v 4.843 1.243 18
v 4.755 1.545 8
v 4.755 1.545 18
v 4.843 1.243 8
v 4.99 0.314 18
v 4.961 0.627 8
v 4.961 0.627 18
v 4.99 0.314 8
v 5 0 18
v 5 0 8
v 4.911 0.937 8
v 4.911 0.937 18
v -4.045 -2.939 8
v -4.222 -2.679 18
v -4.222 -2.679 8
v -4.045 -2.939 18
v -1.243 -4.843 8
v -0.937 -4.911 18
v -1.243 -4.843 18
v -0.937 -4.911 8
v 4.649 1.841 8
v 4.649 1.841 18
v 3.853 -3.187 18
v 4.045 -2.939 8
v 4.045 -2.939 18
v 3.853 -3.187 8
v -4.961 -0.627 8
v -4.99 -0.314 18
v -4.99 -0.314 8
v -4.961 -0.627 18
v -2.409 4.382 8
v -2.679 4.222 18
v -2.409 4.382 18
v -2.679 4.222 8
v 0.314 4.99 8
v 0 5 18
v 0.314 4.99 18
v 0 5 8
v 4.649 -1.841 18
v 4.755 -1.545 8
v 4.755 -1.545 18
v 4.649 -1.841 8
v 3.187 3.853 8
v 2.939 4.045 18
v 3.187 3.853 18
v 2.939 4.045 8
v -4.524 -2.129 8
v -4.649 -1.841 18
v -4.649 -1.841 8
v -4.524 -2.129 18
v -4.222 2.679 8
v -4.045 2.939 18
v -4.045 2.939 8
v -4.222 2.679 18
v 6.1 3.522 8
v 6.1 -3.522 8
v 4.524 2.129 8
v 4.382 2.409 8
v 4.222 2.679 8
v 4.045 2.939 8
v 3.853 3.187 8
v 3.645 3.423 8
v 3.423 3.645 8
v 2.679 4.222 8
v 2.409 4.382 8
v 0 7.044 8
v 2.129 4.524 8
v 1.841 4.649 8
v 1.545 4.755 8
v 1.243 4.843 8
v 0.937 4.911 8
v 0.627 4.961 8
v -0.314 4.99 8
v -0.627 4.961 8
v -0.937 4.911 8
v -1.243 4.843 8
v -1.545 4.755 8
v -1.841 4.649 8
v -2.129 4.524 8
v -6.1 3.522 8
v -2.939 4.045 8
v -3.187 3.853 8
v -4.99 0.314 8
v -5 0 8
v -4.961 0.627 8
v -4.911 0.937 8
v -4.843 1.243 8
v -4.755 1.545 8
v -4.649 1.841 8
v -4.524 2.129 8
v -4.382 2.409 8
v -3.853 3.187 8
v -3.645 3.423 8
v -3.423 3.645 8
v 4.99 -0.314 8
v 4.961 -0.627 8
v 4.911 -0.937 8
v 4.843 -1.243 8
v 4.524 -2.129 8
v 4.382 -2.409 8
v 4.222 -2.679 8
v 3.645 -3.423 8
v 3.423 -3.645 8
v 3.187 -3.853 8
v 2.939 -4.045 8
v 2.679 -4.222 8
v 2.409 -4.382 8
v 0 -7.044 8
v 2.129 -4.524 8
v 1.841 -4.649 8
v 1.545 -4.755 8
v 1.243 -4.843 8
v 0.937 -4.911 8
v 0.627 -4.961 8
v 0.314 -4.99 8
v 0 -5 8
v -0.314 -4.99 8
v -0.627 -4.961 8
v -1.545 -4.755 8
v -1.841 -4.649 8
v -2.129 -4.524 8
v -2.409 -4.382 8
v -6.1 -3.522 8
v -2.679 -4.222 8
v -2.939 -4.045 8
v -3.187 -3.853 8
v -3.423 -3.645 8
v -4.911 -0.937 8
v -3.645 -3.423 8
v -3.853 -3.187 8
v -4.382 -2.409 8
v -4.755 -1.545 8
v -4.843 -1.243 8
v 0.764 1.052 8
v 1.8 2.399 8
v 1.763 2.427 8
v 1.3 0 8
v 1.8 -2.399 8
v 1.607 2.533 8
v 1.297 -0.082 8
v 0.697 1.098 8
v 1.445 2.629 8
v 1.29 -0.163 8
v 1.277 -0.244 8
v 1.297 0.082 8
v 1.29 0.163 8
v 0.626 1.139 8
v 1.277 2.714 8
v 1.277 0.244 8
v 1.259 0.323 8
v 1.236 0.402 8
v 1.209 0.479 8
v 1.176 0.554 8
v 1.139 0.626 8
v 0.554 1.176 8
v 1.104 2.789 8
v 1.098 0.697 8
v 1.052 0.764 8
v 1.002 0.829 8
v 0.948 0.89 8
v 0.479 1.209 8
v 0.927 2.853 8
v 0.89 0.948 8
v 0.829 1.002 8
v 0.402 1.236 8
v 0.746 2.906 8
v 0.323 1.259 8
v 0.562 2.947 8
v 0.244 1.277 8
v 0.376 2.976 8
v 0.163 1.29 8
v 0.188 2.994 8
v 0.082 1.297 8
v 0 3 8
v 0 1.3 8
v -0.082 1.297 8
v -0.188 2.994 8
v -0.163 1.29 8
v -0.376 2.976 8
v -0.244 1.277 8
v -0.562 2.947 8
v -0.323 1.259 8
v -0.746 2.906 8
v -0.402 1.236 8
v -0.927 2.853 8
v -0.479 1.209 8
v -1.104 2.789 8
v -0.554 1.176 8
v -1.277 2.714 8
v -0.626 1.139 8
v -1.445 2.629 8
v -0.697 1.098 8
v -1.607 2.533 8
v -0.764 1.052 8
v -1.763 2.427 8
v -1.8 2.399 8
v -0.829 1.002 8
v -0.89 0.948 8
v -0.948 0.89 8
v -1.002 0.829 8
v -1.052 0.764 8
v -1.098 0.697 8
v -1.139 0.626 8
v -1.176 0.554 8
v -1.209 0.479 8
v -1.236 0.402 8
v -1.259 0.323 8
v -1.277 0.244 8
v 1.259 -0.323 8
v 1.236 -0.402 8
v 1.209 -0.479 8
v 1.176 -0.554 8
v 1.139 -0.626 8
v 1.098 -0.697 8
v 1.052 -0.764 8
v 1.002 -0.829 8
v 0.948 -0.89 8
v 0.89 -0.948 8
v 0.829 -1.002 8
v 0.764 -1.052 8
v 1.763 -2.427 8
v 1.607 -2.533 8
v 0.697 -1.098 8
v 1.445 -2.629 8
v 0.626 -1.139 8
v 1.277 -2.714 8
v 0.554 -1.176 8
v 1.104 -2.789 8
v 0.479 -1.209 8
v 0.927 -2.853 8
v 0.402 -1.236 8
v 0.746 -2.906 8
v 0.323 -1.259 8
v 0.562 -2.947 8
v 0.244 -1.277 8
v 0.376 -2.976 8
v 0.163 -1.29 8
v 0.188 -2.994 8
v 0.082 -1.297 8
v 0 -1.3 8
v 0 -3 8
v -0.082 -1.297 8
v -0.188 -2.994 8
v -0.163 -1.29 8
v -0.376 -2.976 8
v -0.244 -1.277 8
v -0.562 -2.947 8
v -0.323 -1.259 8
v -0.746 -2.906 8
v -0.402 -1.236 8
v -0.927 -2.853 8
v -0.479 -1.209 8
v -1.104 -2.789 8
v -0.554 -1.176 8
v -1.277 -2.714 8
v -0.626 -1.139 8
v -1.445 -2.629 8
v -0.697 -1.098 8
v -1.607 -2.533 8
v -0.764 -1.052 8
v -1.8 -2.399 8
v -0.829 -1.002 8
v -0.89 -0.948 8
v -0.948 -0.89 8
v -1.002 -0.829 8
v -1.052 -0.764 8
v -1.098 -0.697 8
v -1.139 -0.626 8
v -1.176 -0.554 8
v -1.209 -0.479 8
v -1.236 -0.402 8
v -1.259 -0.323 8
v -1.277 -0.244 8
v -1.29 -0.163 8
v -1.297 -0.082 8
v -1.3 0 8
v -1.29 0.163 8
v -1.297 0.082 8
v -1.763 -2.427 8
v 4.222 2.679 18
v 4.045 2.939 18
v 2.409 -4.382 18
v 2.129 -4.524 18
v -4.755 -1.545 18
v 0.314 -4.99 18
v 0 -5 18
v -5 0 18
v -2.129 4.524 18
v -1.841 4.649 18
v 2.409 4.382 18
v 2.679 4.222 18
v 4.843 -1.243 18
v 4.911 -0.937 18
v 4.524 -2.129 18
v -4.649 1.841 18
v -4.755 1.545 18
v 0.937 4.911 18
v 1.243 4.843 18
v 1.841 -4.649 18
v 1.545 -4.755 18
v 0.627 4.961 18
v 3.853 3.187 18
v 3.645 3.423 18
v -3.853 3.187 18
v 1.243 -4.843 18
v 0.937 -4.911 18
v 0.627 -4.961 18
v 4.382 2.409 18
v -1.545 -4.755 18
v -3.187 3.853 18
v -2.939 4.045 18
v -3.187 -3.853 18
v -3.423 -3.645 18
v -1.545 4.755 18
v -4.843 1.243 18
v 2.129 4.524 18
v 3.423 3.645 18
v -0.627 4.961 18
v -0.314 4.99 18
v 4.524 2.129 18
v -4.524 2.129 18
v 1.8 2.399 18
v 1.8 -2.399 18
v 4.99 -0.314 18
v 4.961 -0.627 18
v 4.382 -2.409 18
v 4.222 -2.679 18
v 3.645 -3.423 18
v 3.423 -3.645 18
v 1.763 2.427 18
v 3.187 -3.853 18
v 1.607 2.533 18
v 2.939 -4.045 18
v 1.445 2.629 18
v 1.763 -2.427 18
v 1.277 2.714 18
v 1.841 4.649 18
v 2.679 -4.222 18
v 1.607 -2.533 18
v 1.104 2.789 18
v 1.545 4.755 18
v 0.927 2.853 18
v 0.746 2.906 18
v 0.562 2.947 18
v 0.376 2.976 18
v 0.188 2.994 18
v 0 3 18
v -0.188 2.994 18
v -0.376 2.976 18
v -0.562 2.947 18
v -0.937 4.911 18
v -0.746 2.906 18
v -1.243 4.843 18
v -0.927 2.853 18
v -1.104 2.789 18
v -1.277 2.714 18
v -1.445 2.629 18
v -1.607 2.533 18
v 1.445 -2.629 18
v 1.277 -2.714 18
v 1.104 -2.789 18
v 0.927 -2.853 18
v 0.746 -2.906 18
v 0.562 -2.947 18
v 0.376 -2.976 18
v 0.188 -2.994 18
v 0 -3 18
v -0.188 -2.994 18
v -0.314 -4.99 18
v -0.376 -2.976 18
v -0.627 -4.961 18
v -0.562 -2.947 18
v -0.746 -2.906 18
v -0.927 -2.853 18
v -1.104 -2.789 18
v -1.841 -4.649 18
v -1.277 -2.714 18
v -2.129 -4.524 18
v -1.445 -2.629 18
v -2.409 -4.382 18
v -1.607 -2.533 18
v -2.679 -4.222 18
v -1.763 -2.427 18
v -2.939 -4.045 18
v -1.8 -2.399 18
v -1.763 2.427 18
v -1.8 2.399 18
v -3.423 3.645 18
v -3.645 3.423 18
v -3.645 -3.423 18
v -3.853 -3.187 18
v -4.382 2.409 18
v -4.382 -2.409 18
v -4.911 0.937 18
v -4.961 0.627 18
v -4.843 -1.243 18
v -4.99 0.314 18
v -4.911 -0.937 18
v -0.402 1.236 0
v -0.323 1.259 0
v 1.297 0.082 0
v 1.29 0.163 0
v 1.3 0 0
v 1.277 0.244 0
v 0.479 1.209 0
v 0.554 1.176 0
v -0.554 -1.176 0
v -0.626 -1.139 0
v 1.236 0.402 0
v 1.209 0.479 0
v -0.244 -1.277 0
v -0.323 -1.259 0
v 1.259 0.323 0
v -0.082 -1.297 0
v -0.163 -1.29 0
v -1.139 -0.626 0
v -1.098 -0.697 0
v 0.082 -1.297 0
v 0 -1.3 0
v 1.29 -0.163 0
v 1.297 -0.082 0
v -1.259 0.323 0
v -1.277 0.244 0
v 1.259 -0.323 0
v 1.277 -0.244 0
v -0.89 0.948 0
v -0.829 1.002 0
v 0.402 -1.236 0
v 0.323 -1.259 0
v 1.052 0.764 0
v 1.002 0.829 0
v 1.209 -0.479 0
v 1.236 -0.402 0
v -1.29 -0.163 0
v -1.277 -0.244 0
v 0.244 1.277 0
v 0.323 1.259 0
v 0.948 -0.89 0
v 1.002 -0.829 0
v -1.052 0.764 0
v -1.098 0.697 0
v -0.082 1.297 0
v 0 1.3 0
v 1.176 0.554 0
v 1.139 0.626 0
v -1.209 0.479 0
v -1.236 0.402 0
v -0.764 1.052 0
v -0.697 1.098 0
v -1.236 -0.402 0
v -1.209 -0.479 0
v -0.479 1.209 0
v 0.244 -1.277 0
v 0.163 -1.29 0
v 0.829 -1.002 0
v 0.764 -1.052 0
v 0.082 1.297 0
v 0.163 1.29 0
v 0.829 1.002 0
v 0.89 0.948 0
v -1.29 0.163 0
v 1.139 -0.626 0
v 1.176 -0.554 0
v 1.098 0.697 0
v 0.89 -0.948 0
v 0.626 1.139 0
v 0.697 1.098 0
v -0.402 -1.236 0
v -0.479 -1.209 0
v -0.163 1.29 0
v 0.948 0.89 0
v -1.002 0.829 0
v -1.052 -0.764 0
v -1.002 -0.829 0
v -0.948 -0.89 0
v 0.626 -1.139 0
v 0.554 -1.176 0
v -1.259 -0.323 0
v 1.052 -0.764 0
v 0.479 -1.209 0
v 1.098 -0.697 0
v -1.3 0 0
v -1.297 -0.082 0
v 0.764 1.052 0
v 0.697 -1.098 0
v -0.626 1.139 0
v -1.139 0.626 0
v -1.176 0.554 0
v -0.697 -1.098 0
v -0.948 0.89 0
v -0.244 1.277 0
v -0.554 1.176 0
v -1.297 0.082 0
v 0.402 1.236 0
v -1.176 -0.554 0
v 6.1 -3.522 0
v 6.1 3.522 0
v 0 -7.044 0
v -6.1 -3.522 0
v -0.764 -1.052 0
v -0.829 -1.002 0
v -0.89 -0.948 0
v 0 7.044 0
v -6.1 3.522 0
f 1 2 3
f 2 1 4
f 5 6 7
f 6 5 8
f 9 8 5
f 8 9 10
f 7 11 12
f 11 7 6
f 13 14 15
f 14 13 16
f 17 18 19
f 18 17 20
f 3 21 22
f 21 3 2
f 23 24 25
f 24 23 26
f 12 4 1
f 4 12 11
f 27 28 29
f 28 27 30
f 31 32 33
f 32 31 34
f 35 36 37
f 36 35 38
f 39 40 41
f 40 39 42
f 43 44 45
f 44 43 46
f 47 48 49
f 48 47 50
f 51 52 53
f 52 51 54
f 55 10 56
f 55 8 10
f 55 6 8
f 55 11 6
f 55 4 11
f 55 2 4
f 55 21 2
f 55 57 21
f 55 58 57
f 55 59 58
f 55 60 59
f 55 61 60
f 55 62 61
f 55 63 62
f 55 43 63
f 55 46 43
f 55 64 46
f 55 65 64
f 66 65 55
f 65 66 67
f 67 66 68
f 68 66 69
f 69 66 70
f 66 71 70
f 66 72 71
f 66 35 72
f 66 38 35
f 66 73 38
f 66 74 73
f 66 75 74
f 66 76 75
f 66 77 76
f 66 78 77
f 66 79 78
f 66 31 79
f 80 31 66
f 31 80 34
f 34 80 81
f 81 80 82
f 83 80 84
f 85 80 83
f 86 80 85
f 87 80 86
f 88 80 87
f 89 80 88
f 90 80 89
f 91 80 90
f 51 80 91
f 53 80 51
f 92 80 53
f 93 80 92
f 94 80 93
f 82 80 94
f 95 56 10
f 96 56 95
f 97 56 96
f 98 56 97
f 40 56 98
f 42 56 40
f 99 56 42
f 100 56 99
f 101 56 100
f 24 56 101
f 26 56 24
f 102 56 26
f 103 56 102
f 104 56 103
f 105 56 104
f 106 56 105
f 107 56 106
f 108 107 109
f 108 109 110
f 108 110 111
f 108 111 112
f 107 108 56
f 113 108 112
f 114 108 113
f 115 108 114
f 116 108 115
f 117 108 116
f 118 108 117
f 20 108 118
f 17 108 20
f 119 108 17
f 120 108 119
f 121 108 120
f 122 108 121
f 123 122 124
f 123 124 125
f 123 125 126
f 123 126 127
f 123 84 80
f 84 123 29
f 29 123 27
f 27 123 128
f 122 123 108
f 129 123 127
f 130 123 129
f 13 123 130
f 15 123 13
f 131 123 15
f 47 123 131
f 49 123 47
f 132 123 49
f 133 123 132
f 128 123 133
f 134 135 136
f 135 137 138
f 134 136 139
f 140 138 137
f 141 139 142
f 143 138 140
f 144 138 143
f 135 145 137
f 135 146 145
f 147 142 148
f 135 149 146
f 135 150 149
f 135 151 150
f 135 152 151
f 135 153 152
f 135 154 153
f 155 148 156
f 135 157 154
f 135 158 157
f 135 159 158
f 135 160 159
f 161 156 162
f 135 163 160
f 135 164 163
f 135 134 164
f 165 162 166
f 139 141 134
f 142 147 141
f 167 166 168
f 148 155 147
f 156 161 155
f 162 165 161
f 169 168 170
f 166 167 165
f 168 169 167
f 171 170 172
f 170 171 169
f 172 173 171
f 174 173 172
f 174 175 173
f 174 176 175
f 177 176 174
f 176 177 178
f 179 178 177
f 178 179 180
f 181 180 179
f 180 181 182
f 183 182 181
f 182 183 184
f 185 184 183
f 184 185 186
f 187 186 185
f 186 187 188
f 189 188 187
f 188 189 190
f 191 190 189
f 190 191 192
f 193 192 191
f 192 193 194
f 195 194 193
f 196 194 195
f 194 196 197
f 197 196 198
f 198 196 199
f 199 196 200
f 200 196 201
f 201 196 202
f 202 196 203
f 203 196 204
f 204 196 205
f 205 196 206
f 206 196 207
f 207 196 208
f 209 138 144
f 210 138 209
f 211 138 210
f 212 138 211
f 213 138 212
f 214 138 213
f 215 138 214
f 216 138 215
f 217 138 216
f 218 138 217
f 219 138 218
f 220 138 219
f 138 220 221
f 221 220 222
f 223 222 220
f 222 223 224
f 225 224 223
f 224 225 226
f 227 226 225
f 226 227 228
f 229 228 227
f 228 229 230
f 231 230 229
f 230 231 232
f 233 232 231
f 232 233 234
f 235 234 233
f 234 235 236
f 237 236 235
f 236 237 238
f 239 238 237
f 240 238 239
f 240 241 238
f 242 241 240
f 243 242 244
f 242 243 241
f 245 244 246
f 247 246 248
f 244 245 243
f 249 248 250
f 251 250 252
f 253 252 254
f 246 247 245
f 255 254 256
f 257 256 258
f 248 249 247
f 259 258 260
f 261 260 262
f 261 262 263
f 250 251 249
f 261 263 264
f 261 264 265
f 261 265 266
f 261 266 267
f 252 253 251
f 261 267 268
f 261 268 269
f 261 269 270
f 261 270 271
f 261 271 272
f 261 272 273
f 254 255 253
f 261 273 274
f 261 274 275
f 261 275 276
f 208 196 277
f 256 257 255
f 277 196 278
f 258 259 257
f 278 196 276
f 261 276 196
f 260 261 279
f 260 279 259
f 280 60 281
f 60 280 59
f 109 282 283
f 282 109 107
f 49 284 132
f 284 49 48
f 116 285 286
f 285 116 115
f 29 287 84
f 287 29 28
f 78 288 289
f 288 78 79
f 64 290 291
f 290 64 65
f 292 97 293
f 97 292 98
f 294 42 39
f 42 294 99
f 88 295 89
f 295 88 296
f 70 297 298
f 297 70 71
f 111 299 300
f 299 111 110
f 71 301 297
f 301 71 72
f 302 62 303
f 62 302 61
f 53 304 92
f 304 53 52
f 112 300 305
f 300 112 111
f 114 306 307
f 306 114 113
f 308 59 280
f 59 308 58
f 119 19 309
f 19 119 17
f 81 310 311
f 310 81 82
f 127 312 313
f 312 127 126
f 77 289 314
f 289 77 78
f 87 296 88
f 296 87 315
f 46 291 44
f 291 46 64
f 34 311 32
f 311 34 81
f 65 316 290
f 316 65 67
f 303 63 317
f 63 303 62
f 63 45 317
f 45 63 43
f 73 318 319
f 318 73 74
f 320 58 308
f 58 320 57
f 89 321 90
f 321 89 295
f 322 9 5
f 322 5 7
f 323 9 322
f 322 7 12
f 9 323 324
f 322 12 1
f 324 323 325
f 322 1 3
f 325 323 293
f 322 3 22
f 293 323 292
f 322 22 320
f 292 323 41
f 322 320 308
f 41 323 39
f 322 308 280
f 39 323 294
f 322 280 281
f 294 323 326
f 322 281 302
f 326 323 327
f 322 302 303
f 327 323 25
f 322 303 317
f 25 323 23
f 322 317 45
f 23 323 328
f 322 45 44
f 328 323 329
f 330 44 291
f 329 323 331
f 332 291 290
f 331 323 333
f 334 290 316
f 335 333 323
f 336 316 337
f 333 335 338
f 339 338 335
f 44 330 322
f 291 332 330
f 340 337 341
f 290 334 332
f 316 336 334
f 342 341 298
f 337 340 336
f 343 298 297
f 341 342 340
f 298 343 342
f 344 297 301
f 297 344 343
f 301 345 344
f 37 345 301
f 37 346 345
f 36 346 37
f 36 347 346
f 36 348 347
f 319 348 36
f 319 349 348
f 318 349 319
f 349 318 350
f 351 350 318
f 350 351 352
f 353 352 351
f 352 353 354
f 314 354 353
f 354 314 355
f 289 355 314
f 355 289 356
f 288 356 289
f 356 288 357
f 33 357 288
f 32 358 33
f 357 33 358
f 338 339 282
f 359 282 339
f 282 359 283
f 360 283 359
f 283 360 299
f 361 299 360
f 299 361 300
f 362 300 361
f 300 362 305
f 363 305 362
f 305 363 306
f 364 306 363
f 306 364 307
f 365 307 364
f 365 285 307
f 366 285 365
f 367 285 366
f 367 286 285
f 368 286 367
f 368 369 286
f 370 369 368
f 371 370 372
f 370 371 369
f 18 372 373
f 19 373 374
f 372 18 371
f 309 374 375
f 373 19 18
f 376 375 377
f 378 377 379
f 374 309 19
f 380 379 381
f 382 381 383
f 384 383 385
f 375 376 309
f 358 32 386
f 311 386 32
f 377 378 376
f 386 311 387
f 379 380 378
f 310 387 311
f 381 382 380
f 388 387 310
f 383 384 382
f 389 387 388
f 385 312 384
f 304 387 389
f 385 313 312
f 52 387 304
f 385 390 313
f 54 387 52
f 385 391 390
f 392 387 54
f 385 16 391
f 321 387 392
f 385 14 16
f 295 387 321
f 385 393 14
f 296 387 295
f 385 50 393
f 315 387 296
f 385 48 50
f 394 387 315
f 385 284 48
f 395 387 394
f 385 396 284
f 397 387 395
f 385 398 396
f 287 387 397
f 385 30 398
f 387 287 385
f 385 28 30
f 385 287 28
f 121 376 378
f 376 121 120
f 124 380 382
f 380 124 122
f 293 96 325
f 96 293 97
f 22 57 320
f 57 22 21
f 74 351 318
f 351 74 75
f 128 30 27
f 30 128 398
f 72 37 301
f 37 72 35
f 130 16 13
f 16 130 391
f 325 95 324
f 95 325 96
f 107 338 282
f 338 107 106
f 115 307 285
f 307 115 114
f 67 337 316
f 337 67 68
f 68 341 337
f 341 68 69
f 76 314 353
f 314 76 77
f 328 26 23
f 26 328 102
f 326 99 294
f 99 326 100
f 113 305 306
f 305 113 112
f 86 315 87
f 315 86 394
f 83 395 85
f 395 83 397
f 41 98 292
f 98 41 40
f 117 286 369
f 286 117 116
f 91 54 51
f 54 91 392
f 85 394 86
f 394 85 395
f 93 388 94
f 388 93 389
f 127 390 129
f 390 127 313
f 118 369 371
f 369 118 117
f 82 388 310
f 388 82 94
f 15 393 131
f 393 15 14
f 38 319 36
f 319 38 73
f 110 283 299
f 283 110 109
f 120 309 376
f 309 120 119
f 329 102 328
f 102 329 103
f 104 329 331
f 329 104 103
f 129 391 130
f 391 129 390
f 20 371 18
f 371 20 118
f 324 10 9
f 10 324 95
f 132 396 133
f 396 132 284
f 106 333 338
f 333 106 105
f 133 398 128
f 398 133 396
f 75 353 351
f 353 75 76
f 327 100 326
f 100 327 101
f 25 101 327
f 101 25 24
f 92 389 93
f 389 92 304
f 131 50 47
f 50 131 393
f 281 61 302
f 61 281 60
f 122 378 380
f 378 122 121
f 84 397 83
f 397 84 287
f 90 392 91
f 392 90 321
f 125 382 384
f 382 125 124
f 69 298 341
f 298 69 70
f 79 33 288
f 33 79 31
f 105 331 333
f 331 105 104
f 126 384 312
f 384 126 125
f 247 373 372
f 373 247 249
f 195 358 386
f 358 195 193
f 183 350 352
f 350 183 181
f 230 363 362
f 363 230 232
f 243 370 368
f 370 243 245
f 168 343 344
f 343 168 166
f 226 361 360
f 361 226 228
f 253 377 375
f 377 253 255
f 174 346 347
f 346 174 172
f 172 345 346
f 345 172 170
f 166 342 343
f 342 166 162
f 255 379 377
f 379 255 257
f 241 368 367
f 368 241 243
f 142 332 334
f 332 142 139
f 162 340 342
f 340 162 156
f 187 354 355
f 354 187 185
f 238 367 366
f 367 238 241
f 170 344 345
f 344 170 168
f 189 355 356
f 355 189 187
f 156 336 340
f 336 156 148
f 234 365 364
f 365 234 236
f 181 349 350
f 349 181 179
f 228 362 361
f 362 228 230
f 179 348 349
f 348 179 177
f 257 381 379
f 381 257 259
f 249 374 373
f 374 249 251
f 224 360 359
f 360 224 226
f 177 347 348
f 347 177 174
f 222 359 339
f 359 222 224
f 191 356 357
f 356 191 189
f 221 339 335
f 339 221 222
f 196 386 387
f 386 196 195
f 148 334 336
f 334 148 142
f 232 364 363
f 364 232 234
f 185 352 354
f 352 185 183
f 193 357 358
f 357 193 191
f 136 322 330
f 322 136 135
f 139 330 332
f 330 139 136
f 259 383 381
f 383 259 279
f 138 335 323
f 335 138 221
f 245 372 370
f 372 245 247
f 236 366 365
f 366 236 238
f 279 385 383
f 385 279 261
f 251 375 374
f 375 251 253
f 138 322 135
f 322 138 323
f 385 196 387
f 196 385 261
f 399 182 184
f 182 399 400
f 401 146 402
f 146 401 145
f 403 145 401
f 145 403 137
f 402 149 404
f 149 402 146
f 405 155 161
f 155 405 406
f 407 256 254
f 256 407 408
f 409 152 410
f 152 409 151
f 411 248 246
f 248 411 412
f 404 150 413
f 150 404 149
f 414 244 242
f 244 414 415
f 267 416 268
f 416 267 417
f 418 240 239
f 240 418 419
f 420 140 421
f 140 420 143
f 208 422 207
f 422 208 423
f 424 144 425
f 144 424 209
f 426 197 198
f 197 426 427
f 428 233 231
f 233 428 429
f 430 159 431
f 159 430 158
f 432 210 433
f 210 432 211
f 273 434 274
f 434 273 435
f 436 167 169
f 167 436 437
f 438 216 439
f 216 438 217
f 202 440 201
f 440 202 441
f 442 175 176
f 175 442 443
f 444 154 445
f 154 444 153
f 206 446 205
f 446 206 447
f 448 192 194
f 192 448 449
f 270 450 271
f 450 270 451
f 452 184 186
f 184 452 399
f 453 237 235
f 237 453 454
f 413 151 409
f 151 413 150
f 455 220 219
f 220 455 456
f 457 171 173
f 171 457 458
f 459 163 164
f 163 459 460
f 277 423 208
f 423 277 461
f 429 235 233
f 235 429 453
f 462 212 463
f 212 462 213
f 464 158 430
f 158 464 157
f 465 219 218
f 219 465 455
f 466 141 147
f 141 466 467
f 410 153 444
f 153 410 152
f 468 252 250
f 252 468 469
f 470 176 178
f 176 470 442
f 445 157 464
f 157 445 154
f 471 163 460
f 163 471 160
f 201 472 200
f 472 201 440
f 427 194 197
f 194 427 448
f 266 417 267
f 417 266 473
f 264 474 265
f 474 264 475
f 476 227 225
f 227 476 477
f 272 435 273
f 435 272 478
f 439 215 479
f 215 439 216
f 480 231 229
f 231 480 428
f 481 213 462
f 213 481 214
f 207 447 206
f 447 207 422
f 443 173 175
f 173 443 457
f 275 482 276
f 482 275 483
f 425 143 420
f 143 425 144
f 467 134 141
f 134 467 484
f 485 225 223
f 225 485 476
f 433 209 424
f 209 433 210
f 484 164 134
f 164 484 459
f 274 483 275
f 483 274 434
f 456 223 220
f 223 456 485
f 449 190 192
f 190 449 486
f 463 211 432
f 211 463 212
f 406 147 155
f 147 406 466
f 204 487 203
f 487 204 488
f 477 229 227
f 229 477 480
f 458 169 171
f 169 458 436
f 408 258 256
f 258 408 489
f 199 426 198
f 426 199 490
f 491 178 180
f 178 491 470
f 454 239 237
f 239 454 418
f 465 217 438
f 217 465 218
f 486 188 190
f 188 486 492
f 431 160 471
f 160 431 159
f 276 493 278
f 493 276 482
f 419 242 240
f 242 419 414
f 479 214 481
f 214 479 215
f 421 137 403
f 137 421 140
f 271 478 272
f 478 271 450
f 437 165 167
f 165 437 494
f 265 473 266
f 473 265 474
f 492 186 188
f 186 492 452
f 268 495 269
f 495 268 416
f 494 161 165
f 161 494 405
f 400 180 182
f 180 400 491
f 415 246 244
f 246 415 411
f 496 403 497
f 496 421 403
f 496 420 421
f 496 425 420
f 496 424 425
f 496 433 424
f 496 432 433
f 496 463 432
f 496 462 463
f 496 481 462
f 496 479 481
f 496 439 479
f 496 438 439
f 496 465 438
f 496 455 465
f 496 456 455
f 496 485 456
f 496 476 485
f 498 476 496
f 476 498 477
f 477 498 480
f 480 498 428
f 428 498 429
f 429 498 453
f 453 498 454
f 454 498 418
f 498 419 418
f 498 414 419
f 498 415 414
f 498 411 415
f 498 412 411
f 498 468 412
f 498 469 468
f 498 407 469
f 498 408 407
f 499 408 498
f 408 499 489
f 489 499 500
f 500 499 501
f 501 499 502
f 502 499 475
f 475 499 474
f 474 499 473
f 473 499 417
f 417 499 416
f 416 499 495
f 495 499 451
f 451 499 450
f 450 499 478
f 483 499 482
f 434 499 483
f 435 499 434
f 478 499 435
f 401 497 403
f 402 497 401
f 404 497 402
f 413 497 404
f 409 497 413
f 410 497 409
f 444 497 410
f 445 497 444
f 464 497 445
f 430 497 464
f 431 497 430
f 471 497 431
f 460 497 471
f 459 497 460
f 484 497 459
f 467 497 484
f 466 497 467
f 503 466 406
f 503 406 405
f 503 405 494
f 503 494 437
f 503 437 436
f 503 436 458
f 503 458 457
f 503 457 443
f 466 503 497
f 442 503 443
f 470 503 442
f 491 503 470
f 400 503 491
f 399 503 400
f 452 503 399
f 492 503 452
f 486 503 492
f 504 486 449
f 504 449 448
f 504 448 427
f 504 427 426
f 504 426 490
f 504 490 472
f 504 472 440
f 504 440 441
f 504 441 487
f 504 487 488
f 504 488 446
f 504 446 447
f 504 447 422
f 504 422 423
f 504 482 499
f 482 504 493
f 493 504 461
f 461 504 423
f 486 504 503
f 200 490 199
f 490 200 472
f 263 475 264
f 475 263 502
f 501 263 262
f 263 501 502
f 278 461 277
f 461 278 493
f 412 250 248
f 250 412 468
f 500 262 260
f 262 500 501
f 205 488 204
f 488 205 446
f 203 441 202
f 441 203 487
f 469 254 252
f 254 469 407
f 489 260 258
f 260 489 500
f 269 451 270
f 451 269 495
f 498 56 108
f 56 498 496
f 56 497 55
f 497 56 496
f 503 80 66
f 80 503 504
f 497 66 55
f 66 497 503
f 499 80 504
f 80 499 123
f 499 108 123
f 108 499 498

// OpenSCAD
hexHeight = 8;
conectorHeight = 10;

translate([0, 0, hexHeight])
{
    motor_connector(conectorHeight);
};

difference()
{
    hexagon (12.2, height = hexHeight );
    hollow_cylinder(height = hexHeight , r_outer=1.3, r_inner = 0);
}

module hexagon(size, height)
{
    r = size / sqrt(3);
    echo(r);
    rotate(a=30, v=[0, 0, 1])
    {
        cylinder(r=r, height, $fn=6);
    }
}

module motor_connector(height)
{
    difference()
    {
        hollow_cylinder(height, r_outer=5, r_inner = 0);
        motor_inner_connector(height, width = 3.6, diameter = 6);
    }
}

module motor_inner_connector(h, width, diameter)
{
    intersection()
    {
        hollow_cylinder(h, r_outer=3, r_inner = 0);
        translate([-(width/2),-(diameter/2),0])
        {
            cube([width, diameter, h]);
        }
    }
}

module hollow_cylinder(height, r_outer, r_inner)
{
    difference()
    {
        cylinder(h=height, r=r_outer, center=false, $fn=100);
        cylinder(h=height, r=r_inner, center=false, $fn=100);
    }
}
